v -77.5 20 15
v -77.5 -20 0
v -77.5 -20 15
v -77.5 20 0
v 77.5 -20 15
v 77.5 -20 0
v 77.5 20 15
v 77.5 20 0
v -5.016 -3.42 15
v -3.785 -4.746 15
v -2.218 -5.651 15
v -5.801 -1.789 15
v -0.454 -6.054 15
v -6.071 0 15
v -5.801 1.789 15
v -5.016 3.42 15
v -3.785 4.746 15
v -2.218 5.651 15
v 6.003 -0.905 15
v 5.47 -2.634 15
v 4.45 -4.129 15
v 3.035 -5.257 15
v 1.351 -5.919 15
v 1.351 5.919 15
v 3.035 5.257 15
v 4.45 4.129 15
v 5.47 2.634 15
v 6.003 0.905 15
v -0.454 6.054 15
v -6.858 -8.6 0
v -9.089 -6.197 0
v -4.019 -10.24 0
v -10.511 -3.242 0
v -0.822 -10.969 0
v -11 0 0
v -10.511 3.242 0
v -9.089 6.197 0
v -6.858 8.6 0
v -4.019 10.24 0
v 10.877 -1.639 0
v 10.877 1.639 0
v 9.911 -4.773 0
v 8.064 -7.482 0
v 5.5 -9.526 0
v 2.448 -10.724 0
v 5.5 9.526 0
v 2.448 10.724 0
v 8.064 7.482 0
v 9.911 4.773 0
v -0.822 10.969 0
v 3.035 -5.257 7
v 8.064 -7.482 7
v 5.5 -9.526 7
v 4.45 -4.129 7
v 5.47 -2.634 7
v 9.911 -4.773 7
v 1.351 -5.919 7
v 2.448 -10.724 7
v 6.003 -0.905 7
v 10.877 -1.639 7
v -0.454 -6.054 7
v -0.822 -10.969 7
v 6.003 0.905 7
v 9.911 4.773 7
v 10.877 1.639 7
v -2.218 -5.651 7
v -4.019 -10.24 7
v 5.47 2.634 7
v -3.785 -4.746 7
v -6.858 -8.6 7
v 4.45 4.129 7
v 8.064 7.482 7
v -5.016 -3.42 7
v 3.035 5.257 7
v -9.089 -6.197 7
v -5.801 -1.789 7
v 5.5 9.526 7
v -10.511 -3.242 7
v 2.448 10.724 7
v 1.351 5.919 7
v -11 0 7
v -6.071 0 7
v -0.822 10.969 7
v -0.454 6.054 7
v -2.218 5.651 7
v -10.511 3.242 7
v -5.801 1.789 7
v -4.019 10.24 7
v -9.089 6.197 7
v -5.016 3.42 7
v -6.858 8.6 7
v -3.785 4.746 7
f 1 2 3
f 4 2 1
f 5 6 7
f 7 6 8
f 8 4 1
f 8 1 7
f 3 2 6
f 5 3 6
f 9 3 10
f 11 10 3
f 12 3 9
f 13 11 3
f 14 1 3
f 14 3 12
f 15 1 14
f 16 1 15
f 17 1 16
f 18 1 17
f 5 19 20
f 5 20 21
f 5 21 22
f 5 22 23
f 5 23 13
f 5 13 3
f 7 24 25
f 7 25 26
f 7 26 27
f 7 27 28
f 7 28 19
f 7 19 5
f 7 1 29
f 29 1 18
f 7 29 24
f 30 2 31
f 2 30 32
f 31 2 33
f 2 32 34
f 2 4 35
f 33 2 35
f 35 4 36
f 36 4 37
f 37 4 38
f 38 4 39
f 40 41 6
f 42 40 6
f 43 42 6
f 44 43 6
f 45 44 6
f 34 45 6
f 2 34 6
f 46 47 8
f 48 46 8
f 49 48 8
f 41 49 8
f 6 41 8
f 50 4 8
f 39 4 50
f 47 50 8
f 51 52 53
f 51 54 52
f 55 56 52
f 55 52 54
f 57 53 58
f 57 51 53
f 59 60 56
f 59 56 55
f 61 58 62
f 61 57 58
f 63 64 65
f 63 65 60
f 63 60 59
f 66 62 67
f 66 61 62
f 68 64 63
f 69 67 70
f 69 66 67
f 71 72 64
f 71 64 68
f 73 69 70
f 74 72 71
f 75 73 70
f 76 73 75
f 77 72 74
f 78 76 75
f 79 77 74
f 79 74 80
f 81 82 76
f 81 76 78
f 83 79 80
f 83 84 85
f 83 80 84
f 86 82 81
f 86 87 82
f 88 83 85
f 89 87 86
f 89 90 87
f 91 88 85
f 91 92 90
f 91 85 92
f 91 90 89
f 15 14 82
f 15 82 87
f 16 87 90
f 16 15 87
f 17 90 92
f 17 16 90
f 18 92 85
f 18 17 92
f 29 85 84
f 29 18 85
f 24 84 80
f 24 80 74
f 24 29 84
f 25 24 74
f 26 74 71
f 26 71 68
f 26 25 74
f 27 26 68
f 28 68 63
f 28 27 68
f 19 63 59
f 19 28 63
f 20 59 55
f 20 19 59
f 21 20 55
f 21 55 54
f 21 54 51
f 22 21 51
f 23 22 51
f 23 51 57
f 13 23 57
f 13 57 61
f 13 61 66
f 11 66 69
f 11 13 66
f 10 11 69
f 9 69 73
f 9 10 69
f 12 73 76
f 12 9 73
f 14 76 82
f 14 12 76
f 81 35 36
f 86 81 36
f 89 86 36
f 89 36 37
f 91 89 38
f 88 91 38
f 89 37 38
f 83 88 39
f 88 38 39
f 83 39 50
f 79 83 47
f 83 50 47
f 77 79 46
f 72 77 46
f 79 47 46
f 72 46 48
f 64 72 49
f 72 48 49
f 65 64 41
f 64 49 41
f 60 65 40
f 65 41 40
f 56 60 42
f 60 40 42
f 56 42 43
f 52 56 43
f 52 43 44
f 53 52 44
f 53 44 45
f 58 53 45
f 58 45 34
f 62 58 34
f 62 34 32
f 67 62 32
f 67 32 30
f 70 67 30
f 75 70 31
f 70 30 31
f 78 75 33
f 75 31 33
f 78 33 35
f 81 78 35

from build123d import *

# Parameters (mm, degrees)
SKETCH1_W           = 155
SKETCH1_H           = 40
BOSS_EXTRUDE1_DEPTH = 15
SKETCH2_R           = 11
CUT_EXTRUDE1_DEPTH  = 7
CUT_EXTRUDE2_START  = -15
SKETCH3_R           = 6.070786999
CUT_EXTRUDE2_DEPTH  = 8


with BuildPart() as part:
    # Sketch1 → Boss-Extrude1 (new body)
    with BuildSketch(Plane.XY):
        Rectangle(SKETCH1_W, SKETCH1_H)
    extrude(amount=BOSS_EXTRUDE1_DEPTH)

    # Sketch2 → Cut-Extrude1 (cut)
    with BuildSketch(Plane(origin=(0, 0, 0), x_dir=(-1, 0, 0), z_dir=(0, 0, -1))):
        Circle(SKETCH2_R)
    extrude(amount=-CUT_EXTRUDE1_DEPTH, mode=Mode.SUBTRACT)

    # Sketch3 → Cut-Extrude2 (cut)
    with BuildSketch(Plane(origin=(0, 0, 0), x_dir=(-1, 0, 0), z_dir=(0, 0, -1)).offset(CUT_EXTRUDE2_START)):
        Circle(SKETCH3_R)
    extrude(amount=CUT_EXTRUDE2_DEPTH, mode=Mode.SUBTRACT)


solid = part.part
